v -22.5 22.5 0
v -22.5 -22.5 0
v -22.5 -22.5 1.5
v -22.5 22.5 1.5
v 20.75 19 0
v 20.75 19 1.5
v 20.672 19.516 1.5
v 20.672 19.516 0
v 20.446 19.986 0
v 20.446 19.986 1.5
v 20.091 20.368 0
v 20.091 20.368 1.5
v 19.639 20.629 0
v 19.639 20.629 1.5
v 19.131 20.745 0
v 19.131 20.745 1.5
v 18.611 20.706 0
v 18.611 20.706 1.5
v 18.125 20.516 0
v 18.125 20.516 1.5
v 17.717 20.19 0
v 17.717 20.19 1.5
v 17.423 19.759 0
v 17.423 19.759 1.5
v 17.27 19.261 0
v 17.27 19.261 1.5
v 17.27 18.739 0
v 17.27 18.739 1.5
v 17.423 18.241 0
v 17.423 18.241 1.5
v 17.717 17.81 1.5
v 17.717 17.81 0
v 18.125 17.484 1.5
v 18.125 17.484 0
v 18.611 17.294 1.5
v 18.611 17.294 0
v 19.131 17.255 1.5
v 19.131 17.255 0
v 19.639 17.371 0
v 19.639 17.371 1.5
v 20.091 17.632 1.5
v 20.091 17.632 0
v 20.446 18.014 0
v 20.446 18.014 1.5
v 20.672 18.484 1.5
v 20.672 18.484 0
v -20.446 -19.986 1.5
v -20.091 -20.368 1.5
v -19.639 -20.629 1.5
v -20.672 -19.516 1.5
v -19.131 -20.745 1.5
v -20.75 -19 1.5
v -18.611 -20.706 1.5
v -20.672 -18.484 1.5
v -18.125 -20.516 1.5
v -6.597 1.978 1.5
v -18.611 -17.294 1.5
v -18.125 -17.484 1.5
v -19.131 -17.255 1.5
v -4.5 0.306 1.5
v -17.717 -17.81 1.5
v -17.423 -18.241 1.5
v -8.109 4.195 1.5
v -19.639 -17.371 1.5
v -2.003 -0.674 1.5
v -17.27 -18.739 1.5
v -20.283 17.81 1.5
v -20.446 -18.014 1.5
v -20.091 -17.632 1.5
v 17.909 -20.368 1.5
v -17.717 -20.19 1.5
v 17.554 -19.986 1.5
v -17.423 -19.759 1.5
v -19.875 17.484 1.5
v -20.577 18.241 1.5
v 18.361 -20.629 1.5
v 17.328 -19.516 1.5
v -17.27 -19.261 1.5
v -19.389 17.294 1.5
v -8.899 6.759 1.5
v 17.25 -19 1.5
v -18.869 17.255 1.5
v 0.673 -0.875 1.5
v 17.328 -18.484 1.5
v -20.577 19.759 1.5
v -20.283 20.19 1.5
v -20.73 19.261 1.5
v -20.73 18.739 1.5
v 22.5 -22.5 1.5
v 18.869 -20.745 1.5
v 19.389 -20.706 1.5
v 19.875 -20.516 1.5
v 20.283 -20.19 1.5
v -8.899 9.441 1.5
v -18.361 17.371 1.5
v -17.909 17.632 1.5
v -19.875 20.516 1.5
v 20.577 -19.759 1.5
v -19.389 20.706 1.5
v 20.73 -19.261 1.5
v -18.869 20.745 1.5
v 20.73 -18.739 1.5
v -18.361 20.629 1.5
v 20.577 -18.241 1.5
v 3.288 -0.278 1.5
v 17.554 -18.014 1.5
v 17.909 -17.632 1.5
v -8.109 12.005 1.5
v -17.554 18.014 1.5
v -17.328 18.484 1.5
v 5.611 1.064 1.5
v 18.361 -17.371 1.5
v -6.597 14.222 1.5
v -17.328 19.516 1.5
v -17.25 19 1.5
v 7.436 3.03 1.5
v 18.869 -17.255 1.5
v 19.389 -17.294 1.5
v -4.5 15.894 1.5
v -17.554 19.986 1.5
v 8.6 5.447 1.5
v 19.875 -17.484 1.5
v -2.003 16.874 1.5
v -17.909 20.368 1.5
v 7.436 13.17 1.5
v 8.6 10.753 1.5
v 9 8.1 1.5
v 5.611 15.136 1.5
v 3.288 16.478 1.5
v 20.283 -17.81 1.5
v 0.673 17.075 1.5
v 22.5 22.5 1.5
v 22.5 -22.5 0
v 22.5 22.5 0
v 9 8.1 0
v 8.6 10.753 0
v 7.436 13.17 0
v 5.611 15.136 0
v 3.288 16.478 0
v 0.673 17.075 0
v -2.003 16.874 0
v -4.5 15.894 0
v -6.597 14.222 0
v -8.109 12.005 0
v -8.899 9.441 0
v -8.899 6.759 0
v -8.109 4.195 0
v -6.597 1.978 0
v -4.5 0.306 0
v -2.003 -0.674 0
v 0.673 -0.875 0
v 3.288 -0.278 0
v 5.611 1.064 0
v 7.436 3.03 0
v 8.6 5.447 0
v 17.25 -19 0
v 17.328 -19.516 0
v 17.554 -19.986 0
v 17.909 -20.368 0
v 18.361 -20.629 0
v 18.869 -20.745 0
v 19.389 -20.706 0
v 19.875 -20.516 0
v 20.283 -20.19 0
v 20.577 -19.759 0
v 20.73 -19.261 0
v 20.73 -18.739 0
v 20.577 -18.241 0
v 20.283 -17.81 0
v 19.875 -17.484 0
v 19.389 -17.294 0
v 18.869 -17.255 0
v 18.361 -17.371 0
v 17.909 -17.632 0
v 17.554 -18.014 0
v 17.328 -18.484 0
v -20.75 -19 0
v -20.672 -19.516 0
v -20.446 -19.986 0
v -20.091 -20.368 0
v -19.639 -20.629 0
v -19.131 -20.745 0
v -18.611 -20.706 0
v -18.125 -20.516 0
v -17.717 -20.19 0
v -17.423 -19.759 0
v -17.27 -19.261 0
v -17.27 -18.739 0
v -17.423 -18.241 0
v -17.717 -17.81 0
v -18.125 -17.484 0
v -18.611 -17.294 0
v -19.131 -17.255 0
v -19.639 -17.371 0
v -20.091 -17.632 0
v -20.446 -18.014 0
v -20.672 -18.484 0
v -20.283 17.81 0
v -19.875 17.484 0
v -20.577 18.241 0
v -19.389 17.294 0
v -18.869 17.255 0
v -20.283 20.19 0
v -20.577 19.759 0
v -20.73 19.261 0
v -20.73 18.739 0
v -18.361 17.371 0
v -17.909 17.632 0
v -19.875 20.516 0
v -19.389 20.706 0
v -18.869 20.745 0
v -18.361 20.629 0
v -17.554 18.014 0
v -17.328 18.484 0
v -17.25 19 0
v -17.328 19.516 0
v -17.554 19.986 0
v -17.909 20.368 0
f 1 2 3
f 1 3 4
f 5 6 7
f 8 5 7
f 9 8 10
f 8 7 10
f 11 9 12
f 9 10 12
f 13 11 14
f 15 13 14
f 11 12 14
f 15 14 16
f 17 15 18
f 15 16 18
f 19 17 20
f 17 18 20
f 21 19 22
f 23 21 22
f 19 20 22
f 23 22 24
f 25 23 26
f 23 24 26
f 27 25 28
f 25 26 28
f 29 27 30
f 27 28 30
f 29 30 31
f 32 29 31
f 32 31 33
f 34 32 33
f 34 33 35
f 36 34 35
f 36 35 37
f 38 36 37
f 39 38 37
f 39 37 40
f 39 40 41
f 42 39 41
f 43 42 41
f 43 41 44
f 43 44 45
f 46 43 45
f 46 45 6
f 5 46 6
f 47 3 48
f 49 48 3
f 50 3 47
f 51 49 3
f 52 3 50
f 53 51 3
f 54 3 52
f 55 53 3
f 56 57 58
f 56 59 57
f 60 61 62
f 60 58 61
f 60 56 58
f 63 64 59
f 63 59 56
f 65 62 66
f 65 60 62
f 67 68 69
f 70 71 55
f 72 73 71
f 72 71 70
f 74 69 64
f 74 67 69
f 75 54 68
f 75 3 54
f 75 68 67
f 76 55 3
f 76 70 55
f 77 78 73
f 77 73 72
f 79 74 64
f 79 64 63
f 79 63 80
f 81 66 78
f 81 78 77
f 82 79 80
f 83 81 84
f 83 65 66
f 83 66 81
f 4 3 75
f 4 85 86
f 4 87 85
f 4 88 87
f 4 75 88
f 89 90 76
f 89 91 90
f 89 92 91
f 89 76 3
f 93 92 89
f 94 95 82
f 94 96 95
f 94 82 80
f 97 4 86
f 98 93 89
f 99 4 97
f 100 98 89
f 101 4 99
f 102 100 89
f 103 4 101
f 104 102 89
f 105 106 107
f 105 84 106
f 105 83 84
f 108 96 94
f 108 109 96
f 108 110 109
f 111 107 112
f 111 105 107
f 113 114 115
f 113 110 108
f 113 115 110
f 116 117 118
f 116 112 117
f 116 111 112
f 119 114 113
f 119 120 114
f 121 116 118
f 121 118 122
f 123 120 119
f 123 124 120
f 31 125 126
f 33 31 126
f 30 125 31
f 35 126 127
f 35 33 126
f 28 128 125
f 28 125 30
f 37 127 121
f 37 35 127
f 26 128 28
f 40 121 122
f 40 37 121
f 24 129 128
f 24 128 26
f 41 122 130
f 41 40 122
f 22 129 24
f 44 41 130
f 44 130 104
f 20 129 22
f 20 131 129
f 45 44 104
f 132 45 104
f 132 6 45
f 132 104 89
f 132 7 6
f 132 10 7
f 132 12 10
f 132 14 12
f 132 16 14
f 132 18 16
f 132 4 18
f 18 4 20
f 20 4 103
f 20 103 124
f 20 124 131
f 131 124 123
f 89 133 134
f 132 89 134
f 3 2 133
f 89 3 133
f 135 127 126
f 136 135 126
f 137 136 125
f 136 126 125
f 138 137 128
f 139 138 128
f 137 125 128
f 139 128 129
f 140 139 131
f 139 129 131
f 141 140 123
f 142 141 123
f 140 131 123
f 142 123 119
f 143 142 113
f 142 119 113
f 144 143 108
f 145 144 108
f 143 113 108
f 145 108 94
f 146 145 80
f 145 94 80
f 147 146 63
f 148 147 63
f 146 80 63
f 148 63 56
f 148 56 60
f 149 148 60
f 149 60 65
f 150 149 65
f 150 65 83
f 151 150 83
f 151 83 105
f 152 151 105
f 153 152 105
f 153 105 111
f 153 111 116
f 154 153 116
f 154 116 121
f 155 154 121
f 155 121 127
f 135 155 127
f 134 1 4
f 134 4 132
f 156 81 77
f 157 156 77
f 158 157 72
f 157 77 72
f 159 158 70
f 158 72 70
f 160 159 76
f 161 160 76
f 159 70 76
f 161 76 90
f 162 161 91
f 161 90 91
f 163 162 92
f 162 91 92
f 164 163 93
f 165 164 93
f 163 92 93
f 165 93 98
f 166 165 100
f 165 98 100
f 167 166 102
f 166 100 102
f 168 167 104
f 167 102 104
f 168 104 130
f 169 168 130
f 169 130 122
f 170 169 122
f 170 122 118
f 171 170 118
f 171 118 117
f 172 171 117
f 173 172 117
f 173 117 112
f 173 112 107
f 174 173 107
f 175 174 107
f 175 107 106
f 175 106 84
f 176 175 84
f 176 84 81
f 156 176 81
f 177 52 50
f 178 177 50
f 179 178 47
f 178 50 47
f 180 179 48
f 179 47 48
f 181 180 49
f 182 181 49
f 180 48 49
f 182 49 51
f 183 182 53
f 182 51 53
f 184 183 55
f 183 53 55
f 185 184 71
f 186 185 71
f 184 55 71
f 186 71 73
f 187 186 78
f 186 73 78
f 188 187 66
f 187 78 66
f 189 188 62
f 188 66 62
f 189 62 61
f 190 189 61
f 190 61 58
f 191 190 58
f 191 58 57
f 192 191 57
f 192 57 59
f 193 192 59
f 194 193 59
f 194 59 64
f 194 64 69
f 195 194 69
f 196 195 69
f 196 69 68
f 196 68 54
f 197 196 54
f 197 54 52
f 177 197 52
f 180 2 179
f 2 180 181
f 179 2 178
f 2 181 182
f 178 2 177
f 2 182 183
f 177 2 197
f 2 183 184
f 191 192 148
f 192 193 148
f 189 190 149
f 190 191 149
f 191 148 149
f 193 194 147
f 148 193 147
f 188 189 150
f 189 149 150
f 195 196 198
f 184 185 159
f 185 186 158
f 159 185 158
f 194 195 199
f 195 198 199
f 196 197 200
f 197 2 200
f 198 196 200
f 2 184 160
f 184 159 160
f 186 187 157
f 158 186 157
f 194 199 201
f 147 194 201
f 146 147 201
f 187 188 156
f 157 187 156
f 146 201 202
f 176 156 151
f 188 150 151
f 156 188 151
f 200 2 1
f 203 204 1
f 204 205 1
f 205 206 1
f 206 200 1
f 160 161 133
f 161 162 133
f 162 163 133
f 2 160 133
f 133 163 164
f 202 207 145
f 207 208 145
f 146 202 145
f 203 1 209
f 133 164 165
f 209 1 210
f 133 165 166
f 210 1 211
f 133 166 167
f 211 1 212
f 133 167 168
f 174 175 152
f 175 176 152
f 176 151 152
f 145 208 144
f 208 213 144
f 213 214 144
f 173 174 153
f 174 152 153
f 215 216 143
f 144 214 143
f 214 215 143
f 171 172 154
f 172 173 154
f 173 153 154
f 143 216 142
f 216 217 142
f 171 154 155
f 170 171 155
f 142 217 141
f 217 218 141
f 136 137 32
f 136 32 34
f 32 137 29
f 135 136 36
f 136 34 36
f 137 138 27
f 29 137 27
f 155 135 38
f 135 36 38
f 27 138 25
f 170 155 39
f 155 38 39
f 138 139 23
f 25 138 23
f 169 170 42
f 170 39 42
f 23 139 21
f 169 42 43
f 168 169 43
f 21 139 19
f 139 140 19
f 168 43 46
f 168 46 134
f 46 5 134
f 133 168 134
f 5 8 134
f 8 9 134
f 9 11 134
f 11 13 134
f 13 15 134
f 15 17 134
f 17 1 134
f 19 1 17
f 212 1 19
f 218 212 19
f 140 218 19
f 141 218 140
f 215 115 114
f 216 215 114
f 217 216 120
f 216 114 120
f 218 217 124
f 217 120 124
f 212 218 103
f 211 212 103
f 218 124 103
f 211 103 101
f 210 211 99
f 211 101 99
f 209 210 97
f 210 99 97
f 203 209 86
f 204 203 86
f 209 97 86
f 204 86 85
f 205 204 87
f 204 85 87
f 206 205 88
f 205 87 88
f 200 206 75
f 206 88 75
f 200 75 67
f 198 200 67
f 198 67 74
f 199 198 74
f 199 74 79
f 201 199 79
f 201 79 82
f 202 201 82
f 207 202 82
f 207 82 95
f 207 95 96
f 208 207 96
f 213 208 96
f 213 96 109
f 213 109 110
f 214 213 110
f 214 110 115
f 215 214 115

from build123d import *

# Parameters (mm, degrees)
SKETCH1_W           = 45
SKETCH1_H           = 45
BOSS_EXTRUDE1_DEPTH = 1.5
SKETCH2_R           = 1.75
SKETCH2_R_2         = 9
CUT_EXTRUDE1_DEPTH  = 32.855140872


with BuildPart() as part:
    # Sketch1 → Boss-Extrude1 (new body)
    with BuildSketch(Plane.XY):
        Rectangle(SKETCH1_W, SKETCH1_H)
    extrude(amount=BOSS_EXTRUDE1_DEPTH)

    # Sketch2 → Cut-Extrude1 (cut, through all)
    with BuildSketch(Plane.XY.offset(1.5)):
        with Locations((-19, 19)):
            Circle(SKETCH2_R)
        with Locations(Location((19, -19, 0), (0, 0, 180))):
            Circle(SKETCH2_R)
        with Locations((19, 19)):
            Circle(SKETCH2_R)
        with Locations(Location((-19, -19, 0), (0, 0, 180))):
            Circle(SKETCH2_R)
        with Locations((0, 8.1)):
            Circle(SKETCH2_R_2)
    extrude(amount=-CUT_EXTRUDE1_DEPTH, mode=Mode.SUBTRACT)


solid = part.part
